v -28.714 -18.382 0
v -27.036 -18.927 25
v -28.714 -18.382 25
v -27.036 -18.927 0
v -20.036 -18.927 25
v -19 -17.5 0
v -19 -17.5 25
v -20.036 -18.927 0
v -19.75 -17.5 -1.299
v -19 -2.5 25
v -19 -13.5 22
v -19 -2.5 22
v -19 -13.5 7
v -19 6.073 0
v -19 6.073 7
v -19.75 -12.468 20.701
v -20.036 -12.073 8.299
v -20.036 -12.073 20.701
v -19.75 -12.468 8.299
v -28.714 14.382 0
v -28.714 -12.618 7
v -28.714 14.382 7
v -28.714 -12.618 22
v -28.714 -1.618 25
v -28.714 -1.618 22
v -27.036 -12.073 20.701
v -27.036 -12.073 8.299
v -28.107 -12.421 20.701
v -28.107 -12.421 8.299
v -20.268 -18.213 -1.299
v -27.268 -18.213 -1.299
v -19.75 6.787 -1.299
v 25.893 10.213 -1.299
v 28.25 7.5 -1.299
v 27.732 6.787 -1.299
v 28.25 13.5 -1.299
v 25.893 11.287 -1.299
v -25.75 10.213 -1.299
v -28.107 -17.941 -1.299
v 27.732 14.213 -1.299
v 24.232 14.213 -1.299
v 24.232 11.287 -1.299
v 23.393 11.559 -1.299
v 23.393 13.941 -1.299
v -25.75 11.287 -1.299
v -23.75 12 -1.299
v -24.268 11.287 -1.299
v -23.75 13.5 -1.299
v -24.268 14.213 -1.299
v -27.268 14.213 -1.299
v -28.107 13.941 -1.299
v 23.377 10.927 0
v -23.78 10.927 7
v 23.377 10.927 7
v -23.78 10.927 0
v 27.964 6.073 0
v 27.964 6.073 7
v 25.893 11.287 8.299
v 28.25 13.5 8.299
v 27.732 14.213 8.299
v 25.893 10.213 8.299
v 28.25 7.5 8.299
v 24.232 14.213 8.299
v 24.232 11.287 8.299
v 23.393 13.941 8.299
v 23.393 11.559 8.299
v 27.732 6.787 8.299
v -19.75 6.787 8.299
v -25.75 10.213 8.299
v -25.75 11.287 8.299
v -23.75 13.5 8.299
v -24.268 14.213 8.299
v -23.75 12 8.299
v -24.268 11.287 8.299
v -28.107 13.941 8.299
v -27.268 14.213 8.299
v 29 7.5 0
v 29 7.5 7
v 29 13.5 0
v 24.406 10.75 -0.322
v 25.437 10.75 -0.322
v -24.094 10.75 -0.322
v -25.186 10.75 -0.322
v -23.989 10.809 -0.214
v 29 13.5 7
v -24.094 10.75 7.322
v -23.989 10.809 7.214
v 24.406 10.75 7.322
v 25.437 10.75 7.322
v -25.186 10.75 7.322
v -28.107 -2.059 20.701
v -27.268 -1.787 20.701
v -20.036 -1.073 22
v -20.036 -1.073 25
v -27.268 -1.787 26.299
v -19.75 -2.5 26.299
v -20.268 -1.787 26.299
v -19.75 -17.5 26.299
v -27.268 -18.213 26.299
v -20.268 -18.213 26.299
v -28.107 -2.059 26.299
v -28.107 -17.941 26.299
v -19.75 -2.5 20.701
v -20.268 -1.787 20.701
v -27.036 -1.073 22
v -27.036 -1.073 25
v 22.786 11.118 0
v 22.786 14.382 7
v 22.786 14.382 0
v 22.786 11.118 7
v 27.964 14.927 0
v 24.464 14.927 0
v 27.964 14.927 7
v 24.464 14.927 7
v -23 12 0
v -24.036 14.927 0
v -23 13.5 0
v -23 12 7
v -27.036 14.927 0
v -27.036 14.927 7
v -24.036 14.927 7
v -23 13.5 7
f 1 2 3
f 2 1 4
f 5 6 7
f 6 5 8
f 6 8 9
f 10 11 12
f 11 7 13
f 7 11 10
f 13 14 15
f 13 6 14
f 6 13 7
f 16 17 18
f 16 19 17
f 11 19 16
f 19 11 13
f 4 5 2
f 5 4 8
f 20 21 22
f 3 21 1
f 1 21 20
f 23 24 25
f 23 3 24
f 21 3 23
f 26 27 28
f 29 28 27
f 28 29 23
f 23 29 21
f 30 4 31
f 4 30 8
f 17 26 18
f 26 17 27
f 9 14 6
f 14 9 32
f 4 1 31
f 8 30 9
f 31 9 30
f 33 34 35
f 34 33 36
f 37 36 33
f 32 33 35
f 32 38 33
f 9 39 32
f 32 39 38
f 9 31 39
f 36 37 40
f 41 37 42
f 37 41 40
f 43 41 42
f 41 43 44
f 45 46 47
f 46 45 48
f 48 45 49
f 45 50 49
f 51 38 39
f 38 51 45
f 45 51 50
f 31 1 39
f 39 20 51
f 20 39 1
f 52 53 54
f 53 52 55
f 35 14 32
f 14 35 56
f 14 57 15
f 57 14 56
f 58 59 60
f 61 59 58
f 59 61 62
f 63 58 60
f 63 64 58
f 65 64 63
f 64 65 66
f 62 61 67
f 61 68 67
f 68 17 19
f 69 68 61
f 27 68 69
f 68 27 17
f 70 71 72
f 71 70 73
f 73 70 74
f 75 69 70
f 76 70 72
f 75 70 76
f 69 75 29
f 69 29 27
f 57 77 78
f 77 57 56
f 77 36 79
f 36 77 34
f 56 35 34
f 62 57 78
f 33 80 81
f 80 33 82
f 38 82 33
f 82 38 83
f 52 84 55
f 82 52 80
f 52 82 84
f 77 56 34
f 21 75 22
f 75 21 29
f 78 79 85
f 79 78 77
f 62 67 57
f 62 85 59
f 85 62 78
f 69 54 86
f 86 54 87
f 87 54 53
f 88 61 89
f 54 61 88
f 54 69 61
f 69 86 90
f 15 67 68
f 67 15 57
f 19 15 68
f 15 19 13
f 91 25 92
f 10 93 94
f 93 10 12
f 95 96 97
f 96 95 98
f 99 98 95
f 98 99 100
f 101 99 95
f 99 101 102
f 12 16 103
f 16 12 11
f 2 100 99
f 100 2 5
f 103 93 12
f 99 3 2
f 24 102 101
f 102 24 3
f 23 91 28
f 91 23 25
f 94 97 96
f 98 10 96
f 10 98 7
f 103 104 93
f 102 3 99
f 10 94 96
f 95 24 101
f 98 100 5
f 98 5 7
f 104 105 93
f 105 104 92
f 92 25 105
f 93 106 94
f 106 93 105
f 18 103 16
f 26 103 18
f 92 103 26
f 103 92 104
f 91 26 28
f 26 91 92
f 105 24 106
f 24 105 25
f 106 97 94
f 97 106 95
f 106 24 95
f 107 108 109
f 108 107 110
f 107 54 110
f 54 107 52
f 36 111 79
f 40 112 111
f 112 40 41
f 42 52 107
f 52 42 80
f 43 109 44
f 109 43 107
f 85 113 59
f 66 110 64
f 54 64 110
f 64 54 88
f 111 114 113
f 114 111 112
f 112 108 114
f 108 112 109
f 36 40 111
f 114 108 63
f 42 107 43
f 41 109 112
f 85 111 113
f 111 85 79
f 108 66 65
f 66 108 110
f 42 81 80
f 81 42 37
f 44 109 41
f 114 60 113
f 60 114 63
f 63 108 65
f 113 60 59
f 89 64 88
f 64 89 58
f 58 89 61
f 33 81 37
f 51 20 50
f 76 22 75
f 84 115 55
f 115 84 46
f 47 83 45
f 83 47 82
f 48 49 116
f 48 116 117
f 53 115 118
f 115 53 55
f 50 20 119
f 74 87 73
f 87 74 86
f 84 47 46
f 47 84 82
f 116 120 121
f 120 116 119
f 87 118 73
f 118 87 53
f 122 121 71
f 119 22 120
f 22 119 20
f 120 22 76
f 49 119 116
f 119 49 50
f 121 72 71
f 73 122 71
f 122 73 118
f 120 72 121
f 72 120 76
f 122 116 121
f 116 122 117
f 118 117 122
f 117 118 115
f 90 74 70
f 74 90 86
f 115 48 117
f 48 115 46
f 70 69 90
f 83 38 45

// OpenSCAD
hook_out = 25;
hook_over = 8;
wall_thickness = 2;
top_thickness = 1;
metal_thickness = 1;
gap = 1.5;
metal_gap = metal_thickness + gap;
width = 7;
lip_thickness = 1.5;
top_lip_length = wall_thickness + 1;
bot_lip_length = wall_thickness + 1.5;
wall_height = 55;
trap_width = 25;


module lip_wrap(lip_length) {
  union() {
    cube([width, metal_gap + wall_thickness, top_thickness]);

    translate([0, metal_gap + wall_thickness, 0])
      cube([width, lip_thickness, lip_length]);
  }
}

module makeCableGuard() {
  translate([wall_height / 2, 7.5, 0])
  rotate([0, -90, 0]) {
    union() {
      // main wall
      cube([width, wall_thickness, wall_height]);

      // start of hook that holds cable
      translate([0, 0 - hook_out, wall_height - width])
        cube([width, hook_out, width]);

      // bottom lip around metal
      lip_wrap(bot_lip_length);

      translate([width, 0, wall_height])
        rotate([180, 0, 180])
          // top lip around metal
          lip_wrap(top_lip_length);

          // next part of cable holder
          translate([0, - hook_out, wall_height - width])
           cube([trap_width, 4, width]);

           // hook around cable
           translate([trap_width - 3, - 21, wall_height - hook_over + 1])
             cube([3, hook_over + 3, width]);
    }
  }
}

minkowski()
{
    makeCableGuard();
    sphere(1.5);
}
